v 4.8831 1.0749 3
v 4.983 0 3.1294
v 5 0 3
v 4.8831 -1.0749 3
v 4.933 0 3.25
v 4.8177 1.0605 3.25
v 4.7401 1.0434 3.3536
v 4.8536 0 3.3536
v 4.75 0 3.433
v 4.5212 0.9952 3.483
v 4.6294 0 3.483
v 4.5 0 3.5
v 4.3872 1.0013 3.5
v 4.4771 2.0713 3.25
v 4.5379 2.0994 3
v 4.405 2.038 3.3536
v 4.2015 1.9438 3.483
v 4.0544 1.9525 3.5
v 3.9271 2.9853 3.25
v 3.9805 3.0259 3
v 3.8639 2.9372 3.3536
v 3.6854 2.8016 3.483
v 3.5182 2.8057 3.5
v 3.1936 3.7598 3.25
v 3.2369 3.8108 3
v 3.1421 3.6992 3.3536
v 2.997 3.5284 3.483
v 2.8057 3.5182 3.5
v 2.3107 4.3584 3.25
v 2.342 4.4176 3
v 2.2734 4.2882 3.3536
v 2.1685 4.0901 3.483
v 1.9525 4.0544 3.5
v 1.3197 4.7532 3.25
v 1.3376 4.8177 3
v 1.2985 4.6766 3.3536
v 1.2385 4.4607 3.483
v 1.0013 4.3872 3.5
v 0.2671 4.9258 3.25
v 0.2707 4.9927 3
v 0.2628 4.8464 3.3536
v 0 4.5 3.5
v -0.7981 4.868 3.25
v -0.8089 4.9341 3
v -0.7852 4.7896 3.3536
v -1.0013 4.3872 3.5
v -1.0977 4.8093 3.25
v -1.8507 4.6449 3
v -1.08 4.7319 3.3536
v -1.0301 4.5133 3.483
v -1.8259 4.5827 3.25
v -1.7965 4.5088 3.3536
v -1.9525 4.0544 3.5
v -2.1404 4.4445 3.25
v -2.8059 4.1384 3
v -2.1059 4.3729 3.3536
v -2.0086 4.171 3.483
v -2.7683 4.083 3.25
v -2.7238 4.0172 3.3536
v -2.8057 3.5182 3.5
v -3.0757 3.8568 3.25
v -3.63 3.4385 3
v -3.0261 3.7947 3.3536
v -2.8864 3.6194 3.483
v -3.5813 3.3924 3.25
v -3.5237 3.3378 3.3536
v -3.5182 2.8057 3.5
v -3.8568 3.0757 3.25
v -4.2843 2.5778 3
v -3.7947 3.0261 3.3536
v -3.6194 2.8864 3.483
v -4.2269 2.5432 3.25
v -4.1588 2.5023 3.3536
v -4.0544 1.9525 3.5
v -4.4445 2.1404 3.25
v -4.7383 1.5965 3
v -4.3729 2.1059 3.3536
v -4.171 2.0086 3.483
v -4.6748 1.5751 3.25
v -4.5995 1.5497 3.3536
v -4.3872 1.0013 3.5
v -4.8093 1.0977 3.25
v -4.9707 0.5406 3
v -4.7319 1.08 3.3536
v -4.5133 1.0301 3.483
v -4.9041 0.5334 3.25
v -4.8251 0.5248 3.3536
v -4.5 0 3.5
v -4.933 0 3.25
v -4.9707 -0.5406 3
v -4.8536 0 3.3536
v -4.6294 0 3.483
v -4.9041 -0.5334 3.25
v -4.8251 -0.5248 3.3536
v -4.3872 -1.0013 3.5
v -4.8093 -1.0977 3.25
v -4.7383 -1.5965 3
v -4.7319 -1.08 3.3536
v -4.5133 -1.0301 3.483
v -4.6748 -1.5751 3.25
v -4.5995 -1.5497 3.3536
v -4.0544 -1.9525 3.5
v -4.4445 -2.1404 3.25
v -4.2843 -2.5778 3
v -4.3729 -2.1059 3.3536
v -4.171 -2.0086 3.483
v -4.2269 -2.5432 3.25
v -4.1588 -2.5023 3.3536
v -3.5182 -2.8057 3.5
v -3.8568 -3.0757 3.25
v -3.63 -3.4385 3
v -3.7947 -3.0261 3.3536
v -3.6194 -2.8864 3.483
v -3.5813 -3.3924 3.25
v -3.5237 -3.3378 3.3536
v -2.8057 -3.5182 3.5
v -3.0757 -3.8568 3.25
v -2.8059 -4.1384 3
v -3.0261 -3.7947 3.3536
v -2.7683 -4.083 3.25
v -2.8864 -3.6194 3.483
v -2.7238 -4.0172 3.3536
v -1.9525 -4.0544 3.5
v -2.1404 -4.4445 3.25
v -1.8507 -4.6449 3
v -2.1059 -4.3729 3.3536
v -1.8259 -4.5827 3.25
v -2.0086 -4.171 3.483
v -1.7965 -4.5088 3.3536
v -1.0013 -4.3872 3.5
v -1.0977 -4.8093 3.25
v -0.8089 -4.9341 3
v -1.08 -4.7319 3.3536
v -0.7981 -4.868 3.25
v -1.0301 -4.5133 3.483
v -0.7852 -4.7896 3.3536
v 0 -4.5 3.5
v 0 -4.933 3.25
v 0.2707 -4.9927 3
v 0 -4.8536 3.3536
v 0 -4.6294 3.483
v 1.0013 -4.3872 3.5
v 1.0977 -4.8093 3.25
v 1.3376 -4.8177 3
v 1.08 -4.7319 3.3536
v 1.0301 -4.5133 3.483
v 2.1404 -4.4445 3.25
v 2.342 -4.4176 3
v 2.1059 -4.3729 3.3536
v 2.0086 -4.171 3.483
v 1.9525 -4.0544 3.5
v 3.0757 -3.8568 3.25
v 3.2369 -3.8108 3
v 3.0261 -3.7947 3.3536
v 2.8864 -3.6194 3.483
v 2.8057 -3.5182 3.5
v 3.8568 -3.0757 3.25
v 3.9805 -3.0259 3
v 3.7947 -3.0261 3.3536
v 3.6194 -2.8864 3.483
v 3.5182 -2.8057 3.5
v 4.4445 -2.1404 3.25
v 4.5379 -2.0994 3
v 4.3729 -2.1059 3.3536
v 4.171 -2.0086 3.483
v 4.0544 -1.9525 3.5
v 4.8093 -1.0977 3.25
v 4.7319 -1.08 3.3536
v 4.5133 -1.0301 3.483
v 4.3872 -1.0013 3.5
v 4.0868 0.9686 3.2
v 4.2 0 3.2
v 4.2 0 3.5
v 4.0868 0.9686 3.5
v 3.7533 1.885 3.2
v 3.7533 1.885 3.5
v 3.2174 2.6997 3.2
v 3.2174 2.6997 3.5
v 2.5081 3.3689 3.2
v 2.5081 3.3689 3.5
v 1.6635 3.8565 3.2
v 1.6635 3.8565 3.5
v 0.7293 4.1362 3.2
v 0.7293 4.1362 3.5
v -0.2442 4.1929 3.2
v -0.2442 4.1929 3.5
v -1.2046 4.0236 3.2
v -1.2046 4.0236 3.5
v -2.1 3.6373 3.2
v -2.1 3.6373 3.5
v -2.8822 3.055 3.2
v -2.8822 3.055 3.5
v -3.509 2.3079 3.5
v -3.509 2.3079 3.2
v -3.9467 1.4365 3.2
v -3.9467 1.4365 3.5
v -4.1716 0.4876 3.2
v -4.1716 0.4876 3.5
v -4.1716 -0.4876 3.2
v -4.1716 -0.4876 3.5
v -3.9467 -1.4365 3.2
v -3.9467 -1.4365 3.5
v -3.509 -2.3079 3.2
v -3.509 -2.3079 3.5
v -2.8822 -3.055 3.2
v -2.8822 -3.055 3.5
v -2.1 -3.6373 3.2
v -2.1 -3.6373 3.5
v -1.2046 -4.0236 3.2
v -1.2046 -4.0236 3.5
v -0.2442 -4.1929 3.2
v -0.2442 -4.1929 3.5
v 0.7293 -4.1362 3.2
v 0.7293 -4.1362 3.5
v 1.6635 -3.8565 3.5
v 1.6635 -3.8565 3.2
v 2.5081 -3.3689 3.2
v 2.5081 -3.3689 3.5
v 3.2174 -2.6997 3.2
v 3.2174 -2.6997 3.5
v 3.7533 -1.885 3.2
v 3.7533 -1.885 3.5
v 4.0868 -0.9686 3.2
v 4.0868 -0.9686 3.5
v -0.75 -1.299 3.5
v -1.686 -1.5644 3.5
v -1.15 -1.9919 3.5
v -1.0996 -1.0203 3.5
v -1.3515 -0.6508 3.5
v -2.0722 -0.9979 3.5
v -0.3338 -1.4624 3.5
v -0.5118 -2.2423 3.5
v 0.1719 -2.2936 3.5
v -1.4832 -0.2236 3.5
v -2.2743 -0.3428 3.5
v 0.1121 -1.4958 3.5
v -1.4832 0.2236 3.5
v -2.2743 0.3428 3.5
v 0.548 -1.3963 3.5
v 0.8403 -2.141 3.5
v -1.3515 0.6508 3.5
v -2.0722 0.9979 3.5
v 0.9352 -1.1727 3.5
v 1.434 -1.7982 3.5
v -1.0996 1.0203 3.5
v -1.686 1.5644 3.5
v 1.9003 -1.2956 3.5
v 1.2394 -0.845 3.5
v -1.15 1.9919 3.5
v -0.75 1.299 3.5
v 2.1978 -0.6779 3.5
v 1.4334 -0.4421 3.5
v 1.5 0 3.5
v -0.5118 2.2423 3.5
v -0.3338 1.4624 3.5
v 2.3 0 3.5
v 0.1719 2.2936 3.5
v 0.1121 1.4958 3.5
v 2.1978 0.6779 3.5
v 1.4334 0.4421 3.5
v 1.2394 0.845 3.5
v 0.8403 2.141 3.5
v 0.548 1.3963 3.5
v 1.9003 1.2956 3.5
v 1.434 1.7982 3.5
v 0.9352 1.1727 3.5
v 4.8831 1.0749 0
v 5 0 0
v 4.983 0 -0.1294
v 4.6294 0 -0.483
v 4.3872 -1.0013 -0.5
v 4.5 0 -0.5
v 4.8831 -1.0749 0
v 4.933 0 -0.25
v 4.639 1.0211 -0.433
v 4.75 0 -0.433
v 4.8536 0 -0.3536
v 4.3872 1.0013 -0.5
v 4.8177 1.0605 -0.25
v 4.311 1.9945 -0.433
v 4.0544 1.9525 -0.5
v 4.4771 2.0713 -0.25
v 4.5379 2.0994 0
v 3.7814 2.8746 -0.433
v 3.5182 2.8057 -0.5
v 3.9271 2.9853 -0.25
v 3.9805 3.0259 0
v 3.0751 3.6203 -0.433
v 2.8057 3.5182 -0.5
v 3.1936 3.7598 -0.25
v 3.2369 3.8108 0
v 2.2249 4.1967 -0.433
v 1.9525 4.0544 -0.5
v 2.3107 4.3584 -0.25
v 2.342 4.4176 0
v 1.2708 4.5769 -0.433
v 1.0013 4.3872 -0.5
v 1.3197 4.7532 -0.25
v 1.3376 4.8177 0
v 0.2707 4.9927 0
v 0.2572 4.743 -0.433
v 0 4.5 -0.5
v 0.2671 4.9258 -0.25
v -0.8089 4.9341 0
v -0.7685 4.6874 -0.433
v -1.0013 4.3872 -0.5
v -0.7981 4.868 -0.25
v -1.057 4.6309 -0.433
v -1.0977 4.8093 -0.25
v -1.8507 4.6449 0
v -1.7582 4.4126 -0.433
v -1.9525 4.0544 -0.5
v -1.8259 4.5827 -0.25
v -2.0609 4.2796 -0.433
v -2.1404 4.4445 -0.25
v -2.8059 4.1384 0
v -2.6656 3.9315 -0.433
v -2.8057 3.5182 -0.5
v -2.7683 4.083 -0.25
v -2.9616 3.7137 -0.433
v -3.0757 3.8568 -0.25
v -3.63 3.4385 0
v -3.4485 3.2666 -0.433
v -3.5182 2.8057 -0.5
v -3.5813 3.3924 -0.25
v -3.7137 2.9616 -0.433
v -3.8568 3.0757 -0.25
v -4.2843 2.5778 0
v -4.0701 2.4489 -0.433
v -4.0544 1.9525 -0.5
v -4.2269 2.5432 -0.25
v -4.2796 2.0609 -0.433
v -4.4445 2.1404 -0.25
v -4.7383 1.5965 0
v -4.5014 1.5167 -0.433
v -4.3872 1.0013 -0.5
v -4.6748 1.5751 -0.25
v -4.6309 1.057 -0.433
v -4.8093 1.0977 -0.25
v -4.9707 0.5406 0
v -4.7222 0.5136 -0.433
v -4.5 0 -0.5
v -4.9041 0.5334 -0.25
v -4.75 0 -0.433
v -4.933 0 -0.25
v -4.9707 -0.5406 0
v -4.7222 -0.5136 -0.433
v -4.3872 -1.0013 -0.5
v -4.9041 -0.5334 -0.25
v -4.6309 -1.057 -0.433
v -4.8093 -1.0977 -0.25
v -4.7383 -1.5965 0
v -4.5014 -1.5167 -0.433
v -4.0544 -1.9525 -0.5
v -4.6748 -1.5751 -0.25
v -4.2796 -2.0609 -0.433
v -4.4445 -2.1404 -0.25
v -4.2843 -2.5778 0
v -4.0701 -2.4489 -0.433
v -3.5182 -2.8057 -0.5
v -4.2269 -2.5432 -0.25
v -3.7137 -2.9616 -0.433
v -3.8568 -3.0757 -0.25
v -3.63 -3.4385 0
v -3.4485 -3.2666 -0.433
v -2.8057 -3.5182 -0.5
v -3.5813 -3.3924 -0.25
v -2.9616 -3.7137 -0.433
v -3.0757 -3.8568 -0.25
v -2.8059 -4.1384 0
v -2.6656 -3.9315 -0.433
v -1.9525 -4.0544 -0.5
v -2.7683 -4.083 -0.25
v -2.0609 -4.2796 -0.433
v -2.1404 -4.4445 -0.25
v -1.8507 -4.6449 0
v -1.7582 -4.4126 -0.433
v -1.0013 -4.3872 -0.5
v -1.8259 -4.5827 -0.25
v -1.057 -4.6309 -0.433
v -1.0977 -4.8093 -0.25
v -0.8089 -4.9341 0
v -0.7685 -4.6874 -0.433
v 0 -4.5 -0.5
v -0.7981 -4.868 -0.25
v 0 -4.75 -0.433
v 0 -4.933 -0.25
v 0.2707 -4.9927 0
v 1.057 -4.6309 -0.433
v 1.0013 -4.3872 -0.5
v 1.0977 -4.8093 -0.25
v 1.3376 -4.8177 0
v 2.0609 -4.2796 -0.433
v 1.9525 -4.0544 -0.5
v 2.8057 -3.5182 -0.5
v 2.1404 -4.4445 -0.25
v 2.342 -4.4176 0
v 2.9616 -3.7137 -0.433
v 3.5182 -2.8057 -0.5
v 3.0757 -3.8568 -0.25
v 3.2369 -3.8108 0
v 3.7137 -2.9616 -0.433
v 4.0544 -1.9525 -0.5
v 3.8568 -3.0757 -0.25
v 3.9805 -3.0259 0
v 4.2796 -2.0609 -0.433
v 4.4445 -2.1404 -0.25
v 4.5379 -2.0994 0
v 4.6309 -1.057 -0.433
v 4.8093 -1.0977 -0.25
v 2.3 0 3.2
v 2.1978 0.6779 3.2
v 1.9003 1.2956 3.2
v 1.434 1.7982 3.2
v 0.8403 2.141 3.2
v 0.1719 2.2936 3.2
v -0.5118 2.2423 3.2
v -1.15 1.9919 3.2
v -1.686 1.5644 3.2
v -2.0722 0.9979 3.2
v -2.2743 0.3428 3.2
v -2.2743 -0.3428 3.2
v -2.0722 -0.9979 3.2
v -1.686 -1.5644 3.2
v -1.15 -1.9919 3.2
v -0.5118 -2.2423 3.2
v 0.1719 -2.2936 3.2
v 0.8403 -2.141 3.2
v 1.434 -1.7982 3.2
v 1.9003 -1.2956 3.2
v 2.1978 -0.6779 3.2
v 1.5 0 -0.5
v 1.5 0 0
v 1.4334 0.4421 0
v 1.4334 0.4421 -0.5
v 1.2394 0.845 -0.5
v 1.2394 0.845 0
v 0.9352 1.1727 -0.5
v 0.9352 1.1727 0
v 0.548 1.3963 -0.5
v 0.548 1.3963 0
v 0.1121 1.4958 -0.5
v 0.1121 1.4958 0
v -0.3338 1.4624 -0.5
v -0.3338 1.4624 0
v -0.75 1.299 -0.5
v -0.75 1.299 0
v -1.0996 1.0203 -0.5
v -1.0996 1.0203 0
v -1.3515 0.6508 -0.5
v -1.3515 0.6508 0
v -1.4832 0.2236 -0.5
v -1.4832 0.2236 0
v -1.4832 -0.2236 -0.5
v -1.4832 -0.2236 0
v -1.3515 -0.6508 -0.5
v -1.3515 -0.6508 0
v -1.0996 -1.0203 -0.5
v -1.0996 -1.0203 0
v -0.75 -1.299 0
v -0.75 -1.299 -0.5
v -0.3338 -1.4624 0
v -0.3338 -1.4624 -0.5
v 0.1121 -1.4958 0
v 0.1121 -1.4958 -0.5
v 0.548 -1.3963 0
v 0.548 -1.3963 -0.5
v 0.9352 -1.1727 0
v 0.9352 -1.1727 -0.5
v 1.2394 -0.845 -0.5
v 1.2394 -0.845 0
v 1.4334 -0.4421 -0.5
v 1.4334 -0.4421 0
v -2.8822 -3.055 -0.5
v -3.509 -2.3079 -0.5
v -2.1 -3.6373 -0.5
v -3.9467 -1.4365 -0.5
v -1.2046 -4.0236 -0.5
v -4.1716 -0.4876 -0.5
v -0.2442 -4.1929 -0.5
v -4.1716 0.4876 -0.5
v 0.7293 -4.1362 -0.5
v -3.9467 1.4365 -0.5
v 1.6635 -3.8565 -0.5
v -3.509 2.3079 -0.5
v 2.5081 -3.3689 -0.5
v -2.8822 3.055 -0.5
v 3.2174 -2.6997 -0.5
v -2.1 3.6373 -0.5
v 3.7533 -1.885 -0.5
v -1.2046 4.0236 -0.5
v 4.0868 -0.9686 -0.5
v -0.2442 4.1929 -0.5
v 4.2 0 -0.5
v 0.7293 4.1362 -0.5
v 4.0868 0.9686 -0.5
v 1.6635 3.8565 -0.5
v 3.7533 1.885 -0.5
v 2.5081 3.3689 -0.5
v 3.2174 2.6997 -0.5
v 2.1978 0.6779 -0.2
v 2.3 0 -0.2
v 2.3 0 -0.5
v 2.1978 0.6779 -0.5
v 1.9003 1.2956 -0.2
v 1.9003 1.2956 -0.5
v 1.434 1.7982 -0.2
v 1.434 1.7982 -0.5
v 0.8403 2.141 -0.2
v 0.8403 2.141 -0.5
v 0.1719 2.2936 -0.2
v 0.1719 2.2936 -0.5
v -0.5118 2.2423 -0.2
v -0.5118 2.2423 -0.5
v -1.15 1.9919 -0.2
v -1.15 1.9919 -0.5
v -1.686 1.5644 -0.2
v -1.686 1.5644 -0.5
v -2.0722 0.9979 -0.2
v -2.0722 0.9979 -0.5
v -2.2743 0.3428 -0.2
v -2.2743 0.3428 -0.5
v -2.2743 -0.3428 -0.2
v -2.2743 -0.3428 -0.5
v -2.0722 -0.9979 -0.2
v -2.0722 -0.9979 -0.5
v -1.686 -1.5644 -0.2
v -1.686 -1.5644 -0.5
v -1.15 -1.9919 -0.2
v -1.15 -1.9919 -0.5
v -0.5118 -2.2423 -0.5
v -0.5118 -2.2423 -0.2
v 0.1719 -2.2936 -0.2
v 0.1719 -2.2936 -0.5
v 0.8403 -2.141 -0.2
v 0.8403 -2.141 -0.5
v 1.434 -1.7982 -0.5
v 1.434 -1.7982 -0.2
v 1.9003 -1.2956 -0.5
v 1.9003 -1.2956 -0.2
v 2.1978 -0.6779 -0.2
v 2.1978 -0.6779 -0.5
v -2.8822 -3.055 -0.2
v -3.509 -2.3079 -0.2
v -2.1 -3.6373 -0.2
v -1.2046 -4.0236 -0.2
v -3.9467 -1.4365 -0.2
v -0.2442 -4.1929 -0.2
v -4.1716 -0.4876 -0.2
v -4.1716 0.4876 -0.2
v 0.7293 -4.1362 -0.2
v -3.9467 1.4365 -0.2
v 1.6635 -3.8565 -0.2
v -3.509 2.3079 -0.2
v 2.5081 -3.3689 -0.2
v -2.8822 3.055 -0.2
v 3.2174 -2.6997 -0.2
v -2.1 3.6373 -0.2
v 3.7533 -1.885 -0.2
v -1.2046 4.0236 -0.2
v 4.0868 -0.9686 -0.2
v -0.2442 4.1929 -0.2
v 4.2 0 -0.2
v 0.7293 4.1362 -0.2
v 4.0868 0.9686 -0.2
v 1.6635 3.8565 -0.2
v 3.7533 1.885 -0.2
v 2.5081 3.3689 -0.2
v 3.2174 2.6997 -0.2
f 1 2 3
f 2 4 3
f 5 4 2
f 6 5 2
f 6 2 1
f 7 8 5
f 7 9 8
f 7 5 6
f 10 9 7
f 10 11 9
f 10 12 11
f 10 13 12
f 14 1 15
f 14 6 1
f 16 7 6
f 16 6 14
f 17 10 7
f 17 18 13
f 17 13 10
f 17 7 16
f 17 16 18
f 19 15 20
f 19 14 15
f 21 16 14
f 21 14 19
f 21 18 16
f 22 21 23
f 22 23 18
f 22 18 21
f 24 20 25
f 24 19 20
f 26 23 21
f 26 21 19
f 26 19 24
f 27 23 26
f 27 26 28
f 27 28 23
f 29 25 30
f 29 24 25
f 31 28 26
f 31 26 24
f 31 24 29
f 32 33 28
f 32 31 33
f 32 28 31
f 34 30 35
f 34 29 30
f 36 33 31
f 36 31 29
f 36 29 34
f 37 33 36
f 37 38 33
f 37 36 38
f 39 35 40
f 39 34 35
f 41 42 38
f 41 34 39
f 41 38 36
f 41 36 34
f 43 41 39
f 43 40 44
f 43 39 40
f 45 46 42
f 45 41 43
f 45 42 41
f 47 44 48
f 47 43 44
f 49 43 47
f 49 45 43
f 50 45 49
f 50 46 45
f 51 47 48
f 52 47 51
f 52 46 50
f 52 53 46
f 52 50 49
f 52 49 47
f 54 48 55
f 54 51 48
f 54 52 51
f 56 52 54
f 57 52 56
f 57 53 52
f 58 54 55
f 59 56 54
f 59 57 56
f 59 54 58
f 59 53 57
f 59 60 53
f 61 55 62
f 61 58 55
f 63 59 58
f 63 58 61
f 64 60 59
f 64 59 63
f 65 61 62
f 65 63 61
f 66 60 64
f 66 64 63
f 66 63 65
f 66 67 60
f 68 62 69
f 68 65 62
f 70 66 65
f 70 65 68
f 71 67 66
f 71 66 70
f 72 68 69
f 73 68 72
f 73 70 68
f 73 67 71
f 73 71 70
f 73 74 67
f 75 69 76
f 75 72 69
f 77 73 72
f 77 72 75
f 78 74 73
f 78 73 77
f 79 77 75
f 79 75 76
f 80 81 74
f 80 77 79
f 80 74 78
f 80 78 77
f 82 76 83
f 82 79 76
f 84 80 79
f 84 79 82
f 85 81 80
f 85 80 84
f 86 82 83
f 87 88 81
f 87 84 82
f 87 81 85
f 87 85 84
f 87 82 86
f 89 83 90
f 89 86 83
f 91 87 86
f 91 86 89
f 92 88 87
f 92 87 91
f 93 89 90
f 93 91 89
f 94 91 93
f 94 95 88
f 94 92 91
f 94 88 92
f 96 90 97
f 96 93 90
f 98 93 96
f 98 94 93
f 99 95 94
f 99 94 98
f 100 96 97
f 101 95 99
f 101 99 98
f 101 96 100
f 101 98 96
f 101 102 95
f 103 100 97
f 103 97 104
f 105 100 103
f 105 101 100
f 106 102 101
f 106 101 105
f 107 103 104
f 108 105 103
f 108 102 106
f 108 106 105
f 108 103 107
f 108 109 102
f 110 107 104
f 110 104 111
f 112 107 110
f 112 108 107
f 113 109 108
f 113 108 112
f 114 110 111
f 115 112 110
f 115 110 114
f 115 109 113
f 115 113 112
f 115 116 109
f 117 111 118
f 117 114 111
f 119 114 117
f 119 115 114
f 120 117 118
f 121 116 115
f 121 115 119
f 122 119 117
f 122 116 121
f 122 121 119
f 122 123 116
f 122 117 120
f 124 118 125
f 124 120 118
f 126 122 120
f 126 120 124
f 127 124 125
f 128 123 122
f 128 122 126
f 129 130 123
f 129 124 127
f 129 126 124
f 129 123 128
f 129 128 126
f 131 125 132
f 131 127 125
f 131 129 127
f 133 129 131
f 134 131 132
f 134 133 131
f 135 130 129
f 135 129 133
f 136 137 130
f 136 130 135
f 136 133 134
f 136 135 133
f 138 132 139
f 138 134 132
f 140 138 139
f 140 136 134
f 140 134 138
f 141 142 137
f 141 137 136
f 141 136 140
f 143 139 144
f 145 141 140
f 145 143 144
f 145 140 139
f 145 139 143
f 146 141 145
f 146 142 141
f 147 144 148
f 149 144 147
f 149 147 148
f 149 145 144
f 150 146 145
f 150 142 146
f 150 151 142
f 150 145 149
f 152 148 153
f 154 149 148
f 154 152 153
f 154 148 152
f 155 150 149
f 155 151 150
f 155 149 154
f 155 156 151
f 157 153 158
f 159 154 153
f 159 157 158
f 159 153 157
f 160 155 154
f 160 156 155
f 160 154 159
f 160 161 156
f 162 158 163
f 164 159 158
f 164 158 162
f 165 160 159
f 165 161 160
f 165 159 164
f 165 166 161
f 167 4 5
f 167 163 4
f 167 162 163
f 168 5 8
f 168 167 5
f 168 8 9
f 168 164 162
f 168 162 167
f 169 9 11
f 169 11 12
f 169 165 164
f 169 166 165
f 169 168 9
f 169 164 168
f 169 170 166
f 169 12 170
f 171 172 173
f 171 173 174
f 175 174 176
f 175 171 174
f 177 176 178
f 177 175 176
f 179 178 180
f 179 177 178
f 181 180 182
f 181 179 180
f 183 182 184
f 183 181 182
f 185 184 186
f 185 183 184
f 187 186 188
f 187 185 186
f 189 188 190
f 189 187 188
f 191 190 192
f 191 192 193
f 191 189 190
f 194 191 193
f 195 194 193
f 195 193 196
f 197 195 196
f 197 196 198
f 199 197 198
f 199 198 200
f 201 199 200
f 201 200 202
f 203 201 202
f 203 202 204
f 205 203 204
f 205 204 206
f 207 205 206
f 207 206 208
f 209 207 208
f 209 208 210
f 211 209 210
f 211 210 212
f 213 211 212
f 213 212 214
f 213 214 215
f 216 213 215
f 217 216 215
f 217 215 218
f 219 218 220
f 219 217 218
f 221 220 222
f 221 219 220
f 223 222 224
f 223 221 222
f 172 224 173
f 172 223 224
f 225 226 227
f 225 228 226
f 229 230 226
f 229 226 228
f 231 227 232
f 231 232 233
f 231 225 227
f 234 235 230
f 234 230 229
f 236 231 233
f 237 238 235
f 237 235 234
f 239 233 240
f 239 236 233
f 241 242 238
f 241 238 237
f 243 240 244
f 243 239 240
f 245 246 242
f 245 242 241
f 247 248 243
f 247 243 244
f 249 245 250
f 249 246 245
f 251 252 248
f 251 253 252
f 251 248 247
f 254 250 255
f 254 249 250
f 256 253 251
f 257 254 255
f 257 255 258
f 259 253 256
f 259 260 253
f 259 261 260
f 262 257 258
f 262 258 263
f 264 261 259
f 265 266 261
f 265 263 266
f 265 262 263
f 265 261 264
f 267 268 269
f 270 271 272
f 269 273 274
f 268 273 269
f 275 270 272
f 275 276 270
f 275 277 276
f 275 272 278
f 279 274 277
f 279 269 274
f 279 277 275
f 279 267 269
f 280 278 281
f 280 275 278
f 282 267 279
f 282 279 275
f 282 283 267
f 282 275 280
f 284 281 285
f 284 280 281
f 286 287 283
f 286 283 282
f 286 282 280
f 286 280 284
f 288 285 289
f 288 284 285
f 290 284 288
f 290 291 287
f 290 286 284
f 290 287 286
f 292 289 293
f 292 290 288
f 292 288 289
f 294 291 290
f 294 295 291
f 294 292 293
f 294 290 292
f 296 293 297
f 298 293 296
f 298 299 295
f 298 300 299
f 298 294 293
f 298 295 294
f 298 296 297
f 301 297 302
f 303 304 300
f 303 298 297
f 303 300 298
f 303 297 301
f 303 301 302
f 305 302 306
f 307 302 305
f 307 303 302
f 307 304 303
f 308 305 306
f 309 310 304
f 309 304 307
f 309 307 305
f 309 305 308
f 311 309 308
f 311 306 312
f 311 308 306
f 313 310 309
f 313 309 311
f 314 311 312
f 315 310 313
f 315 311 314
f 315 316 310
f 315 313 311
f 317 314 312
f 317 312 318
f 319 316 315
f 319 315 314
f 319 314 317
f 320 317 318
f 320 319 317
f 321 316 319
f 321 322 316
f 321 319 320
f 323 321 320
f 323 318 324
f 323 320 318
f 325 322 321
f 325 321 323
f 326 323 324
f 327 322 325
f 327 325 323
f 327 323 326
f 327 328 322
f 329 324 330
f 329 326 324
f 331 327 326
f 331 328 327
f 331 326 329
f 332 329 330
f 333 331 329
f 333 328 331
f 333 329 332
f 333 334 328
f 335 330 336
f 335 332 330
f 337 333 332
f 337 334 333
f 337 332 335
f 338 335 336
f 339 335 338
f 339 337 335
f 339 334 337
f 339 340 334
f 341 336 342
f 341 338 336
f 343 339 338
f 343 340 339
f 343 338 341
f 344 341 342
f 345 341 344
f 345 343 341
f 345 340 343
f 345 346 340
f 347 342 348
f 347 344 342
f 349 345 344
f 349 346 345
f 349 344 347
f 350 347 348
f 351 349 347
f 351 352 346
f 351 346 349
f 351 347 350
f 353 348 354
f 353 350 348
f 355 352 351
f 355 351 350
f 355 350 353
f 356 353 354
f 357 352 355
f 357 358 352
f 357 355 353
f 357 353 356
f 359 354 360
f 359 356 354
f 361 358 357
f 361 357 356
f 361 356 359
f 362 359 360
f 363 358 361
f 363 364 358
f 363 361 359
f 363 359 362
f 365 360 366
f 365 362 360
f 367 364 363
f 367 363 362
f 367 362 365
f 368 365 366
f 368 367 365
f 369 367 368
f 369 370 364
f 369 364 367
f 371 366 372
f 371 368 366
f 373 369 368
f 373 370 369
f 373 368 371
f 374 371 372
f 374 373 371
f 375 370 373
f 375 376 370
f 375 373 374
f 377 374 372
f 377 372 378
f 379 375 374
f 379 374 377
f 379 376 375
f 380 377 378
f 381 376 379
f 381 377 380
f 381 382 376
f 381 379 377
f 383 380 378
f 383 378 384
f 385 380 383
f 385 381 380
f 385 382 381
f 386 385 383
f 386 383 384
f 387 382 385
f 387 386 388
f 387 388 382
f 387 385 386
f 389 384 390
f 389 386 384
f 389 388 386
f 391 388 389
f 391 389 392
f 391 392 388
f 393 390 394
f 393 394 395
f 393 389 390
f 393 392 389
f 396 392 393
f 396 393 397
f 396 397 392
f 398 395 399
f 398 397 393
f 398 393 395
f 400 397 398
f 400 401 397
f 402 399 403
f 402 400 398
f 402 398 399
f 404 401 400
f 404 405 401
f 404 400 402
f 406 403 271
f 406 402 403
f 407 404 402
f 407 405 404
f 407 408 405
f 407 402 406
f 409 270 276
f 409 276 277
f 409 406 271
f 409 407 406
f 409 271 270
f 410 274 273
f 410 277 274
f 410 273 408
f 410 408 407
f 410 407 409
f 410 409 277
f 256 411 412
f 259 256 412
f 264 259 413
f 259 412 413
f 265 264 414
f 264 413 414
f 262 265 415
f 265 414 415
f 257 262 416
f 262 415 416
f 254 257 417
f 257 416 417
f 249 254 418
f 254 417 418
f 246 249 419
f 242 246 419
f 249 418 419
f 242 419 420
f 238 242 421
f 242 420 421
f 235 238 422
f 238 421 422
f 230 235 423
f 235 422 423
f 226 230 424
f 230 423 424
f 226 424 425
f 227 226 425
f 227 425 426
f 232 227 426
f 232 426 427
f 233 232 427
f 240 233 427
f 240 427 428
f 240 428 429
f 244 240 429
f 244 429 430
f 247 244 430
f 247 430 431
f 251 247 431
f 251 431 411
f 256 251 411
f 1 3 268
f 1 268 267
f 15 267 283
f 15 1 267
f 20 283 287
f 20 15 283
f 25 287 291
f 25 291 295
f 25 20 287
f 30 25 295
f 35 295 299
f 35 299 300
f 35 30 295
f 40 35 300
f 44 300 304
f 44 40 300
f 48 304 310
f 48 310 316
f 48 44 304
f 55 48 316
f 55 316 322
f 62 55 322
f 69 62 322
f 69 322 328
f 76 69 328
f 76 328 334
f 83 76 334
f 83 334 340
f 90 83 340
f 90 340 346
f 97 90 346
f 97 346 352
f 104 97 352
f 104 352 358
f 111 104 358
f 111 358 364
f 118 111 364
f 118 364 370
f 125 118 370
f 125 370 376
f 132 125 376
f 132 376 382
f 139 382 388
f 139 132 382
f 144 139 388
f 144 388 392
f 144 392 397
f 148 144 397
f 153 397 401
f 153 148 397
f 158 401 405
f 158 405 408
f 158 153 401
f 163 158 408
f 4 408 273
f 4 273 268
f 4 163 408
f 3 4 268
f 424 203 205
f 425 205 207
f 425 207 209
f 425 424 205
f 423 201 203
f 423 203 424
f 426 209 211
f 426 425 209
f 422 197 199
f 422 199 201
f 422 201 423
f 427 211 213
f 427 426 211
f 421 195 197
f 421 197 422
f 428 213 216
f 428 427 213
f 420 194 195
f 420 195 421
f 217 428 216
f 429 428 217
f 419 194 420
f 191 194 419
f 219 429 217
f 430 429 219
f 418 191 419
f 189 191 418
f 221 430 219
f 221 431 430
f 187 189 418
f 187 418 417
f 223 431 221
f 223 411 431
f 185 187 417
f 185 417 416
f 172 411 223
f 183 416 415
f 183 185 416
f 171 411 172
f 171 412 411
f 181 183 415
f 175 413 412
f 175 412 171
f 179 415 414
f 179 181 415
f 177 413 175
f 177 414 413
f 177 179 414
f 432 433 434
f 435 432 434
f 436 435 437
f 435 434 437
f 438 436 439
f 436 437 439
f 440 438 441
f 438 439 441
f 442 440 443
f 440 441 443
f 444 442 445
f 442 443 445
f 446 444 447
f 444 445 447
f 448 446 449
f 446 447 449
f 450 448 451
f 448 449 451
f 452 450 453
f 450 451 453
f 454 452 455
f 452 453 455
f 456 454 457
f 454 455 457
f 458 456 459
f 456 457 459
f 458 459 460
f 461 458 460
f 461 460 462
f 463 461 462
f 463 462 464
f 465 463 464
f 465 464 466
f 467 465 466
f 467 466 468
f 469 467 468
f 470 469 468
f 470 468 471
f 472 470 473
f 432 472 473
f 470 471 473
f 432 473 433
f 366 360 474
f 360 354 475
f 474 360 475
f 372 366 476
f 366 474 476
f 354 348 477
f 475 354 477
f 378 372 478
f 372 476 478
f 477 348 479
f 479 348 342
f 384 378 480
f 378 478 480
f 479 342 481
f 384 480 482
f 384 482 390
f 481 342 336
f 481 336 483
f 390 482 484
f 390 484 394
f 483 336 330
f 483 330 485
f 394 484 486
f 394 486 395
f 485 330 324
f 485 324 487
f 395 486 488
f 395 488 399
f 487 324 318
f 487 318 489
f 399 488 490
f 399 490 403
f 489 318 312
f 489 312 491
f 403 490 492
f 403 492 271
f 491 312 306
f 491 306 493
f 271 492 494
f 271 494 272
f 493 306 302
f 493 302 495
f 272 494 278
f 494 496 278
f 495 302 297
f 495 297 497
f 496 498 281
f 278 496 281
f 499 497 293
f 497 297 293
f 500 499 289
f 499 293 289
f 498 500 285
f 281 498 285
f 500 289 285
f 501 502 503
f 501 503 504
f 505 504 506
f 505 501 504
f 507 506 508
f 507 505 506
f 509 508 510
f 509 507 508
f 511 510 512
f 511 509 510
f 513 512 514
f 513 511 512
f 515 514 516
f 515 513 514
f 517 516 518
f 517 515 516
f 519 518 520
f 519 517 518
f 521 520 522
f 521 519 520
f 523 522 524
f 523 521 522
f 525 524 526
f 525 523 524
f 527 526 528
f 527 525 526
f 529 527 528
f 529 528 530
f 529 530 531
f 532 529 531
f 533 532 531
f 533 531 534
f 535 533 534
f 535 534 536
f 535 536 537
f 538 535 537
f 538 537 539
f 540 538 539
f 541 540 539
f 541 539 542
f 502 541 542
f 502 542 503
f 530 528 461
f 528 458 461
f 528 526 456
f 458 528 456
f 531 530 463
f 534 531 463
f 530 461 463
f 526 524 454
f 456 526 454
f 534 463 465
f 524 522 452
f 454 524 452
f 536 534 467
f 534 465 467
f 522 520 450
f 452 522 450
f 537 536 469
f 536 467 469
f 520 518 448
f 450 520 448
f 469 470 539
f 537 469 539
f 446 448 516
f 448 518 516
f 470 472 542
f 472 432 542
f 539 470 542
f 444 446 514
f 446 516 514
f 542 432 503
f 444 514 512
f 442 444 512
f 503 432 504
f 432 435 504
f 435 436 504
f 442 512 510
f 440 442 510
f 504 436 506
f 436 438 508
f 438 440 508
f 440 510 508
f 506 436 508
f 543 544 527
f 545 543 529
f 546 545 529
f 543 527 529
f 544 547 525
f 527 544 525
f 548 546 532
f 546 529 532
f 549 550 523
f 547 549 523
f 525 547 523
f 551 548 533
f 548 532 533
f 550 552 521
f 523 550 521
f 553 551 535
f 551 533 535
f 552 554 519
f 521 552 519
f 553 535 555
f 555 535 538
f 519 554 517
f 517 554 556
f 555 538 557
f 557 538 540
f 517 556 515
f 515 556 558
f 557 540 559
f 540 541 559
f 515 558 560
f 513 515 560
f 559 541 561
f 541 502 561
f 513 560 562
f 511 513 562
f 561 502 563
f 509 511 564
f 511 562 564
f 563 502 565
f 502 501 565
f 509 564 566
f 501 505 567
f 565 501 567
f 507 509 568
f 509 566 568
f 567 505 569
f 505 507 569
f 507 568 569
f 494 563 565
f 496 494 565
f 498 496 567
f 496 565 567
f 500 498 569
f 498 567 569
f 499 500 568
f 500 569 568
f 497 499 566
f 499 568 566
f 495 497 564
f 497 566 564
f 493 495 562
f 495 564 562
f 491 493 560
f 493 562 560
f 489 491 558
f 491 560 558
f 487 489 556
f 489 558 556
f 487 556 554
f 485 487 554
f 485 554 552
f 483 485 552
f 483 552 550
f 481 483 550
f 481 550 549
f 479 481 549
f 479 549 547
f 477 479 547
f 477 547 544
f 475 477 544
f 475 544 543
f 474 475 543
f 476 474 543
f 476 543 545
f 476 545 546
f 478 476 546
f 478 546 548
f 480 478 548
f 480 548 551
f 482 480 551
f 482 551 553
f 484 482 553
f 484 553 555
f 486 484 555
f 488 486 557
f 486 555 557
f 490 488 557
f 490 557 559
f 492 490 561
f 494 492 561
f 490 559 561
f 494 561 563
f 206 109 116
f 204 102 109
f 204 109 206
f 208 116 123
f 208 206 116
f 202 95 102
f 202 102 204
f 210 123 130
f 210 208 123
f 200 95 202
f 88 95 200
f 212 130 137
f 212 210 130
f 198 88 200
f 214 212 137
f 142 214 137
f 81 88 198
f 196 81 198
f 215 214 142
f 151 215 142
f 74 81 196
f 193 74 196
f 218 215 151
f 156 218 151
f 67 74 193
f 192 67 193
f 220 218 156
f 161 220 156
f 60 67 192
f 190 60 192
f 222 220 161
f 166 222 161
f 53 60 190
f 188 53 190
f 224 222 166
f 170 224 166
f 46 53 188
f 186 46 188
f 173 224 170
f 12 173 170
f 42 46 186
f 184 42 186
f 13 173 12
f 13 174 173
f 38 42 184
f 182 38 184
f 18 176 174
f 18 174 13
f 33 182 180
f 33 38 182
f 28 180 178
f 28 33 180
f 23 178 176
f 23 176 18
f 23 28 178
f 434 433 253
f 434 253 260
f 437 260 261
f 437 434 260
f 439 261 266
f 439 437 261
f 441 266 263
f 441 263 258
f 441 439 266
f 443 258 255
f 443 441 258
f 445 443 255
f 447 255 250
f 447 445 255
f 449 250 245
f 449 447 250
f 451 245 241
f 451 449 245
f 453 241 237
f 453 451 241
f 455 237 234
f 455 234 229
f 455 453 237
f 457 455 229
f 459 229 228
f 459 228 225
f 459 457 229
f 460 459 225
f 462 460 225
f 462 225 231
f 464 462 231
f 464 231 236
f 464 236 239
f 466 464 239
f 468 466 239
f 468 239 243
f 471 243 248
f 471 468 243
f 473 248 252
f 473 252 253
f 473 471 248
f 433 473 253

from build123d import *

# Parameters (mm, degrees)
F0_R     = 5
F0_R_2   = 4.2
F1_DEPTH = 3.5
F0_R_3   = 2.3
F2_DEPTH = 3.2
F0_R_4   = 1.5
F3_DEPTH = 3.5
F4_DEPTH = 0.5
F5_DEPTH = 0.5
F6_DEPTH = 0.2
F7_R     = 0.49999


# Not quite as in the source:
# - a fillet or chamfer is up to 0.001 mm smaller than in the source, because OpenCascade refuses the exact size


with BuildPart() as f1:
    # F0 (on Top) → F1 (new body)
    with BuildSketch(Plane.XY):
        Circle(F0_R)
        Circle(F0_R_2, mode=Mode.SUBTRACT)
    extrude(amount=F1_DEPTH)

    # F0 (on Top) → F2 (join)
    with BuildSketch(Plane.XY):
        Circle(F0_R_2)
        Circle(F0_R_3, mode=Mode.SUBTRACT)
    extrude(amount=F2_DEPTH)

    # F0 (on Top) → F3 (join)
    with BuildSketch(Plane.XY):
        Circle(F0_R_3)
        Circle(F0_R_4, mode=Mode.SUBTRACT)
    extrude(amount=F3_DEPTH)

    # F0 (on Top) → F4 (join)
    with BuildSketch(Plane.XY):
        Circle(F0_R)
        Circle(F0_R_2, mode=Mode.SUBTRACT)
    extrude(amount=-F4_DEPTH)

    # F0 (on Top) → F5 (join)
    with BuildSketch(Plane.XY):
        Circle(F0_R_3)
        Circle(F0_R_4, mode=Mode.SUBTRACT)
    extrude(amount=-F5_DEPTH)

    # F0 (on Top) → F6 (join)
    with BuildSketch(Plane.XY):
        Circle(F0_R_2)
        Circle(F0_R_3, mode=Mode.SUBTRACT)
    extrude(amount=-F6_DEPTH)

    # F7 (radius 0.5 in the source; OpenCascade refuses exactly that, so slightly less here)
    f7_edges = [f1.edges().sort_by_distance(p)[0] for p in [
        (-5, 0, 3.5),
        (-5, 0, -0.5),
    ]]
    fillet(f7_edges, radius=F7_R)


solid = f1.part
